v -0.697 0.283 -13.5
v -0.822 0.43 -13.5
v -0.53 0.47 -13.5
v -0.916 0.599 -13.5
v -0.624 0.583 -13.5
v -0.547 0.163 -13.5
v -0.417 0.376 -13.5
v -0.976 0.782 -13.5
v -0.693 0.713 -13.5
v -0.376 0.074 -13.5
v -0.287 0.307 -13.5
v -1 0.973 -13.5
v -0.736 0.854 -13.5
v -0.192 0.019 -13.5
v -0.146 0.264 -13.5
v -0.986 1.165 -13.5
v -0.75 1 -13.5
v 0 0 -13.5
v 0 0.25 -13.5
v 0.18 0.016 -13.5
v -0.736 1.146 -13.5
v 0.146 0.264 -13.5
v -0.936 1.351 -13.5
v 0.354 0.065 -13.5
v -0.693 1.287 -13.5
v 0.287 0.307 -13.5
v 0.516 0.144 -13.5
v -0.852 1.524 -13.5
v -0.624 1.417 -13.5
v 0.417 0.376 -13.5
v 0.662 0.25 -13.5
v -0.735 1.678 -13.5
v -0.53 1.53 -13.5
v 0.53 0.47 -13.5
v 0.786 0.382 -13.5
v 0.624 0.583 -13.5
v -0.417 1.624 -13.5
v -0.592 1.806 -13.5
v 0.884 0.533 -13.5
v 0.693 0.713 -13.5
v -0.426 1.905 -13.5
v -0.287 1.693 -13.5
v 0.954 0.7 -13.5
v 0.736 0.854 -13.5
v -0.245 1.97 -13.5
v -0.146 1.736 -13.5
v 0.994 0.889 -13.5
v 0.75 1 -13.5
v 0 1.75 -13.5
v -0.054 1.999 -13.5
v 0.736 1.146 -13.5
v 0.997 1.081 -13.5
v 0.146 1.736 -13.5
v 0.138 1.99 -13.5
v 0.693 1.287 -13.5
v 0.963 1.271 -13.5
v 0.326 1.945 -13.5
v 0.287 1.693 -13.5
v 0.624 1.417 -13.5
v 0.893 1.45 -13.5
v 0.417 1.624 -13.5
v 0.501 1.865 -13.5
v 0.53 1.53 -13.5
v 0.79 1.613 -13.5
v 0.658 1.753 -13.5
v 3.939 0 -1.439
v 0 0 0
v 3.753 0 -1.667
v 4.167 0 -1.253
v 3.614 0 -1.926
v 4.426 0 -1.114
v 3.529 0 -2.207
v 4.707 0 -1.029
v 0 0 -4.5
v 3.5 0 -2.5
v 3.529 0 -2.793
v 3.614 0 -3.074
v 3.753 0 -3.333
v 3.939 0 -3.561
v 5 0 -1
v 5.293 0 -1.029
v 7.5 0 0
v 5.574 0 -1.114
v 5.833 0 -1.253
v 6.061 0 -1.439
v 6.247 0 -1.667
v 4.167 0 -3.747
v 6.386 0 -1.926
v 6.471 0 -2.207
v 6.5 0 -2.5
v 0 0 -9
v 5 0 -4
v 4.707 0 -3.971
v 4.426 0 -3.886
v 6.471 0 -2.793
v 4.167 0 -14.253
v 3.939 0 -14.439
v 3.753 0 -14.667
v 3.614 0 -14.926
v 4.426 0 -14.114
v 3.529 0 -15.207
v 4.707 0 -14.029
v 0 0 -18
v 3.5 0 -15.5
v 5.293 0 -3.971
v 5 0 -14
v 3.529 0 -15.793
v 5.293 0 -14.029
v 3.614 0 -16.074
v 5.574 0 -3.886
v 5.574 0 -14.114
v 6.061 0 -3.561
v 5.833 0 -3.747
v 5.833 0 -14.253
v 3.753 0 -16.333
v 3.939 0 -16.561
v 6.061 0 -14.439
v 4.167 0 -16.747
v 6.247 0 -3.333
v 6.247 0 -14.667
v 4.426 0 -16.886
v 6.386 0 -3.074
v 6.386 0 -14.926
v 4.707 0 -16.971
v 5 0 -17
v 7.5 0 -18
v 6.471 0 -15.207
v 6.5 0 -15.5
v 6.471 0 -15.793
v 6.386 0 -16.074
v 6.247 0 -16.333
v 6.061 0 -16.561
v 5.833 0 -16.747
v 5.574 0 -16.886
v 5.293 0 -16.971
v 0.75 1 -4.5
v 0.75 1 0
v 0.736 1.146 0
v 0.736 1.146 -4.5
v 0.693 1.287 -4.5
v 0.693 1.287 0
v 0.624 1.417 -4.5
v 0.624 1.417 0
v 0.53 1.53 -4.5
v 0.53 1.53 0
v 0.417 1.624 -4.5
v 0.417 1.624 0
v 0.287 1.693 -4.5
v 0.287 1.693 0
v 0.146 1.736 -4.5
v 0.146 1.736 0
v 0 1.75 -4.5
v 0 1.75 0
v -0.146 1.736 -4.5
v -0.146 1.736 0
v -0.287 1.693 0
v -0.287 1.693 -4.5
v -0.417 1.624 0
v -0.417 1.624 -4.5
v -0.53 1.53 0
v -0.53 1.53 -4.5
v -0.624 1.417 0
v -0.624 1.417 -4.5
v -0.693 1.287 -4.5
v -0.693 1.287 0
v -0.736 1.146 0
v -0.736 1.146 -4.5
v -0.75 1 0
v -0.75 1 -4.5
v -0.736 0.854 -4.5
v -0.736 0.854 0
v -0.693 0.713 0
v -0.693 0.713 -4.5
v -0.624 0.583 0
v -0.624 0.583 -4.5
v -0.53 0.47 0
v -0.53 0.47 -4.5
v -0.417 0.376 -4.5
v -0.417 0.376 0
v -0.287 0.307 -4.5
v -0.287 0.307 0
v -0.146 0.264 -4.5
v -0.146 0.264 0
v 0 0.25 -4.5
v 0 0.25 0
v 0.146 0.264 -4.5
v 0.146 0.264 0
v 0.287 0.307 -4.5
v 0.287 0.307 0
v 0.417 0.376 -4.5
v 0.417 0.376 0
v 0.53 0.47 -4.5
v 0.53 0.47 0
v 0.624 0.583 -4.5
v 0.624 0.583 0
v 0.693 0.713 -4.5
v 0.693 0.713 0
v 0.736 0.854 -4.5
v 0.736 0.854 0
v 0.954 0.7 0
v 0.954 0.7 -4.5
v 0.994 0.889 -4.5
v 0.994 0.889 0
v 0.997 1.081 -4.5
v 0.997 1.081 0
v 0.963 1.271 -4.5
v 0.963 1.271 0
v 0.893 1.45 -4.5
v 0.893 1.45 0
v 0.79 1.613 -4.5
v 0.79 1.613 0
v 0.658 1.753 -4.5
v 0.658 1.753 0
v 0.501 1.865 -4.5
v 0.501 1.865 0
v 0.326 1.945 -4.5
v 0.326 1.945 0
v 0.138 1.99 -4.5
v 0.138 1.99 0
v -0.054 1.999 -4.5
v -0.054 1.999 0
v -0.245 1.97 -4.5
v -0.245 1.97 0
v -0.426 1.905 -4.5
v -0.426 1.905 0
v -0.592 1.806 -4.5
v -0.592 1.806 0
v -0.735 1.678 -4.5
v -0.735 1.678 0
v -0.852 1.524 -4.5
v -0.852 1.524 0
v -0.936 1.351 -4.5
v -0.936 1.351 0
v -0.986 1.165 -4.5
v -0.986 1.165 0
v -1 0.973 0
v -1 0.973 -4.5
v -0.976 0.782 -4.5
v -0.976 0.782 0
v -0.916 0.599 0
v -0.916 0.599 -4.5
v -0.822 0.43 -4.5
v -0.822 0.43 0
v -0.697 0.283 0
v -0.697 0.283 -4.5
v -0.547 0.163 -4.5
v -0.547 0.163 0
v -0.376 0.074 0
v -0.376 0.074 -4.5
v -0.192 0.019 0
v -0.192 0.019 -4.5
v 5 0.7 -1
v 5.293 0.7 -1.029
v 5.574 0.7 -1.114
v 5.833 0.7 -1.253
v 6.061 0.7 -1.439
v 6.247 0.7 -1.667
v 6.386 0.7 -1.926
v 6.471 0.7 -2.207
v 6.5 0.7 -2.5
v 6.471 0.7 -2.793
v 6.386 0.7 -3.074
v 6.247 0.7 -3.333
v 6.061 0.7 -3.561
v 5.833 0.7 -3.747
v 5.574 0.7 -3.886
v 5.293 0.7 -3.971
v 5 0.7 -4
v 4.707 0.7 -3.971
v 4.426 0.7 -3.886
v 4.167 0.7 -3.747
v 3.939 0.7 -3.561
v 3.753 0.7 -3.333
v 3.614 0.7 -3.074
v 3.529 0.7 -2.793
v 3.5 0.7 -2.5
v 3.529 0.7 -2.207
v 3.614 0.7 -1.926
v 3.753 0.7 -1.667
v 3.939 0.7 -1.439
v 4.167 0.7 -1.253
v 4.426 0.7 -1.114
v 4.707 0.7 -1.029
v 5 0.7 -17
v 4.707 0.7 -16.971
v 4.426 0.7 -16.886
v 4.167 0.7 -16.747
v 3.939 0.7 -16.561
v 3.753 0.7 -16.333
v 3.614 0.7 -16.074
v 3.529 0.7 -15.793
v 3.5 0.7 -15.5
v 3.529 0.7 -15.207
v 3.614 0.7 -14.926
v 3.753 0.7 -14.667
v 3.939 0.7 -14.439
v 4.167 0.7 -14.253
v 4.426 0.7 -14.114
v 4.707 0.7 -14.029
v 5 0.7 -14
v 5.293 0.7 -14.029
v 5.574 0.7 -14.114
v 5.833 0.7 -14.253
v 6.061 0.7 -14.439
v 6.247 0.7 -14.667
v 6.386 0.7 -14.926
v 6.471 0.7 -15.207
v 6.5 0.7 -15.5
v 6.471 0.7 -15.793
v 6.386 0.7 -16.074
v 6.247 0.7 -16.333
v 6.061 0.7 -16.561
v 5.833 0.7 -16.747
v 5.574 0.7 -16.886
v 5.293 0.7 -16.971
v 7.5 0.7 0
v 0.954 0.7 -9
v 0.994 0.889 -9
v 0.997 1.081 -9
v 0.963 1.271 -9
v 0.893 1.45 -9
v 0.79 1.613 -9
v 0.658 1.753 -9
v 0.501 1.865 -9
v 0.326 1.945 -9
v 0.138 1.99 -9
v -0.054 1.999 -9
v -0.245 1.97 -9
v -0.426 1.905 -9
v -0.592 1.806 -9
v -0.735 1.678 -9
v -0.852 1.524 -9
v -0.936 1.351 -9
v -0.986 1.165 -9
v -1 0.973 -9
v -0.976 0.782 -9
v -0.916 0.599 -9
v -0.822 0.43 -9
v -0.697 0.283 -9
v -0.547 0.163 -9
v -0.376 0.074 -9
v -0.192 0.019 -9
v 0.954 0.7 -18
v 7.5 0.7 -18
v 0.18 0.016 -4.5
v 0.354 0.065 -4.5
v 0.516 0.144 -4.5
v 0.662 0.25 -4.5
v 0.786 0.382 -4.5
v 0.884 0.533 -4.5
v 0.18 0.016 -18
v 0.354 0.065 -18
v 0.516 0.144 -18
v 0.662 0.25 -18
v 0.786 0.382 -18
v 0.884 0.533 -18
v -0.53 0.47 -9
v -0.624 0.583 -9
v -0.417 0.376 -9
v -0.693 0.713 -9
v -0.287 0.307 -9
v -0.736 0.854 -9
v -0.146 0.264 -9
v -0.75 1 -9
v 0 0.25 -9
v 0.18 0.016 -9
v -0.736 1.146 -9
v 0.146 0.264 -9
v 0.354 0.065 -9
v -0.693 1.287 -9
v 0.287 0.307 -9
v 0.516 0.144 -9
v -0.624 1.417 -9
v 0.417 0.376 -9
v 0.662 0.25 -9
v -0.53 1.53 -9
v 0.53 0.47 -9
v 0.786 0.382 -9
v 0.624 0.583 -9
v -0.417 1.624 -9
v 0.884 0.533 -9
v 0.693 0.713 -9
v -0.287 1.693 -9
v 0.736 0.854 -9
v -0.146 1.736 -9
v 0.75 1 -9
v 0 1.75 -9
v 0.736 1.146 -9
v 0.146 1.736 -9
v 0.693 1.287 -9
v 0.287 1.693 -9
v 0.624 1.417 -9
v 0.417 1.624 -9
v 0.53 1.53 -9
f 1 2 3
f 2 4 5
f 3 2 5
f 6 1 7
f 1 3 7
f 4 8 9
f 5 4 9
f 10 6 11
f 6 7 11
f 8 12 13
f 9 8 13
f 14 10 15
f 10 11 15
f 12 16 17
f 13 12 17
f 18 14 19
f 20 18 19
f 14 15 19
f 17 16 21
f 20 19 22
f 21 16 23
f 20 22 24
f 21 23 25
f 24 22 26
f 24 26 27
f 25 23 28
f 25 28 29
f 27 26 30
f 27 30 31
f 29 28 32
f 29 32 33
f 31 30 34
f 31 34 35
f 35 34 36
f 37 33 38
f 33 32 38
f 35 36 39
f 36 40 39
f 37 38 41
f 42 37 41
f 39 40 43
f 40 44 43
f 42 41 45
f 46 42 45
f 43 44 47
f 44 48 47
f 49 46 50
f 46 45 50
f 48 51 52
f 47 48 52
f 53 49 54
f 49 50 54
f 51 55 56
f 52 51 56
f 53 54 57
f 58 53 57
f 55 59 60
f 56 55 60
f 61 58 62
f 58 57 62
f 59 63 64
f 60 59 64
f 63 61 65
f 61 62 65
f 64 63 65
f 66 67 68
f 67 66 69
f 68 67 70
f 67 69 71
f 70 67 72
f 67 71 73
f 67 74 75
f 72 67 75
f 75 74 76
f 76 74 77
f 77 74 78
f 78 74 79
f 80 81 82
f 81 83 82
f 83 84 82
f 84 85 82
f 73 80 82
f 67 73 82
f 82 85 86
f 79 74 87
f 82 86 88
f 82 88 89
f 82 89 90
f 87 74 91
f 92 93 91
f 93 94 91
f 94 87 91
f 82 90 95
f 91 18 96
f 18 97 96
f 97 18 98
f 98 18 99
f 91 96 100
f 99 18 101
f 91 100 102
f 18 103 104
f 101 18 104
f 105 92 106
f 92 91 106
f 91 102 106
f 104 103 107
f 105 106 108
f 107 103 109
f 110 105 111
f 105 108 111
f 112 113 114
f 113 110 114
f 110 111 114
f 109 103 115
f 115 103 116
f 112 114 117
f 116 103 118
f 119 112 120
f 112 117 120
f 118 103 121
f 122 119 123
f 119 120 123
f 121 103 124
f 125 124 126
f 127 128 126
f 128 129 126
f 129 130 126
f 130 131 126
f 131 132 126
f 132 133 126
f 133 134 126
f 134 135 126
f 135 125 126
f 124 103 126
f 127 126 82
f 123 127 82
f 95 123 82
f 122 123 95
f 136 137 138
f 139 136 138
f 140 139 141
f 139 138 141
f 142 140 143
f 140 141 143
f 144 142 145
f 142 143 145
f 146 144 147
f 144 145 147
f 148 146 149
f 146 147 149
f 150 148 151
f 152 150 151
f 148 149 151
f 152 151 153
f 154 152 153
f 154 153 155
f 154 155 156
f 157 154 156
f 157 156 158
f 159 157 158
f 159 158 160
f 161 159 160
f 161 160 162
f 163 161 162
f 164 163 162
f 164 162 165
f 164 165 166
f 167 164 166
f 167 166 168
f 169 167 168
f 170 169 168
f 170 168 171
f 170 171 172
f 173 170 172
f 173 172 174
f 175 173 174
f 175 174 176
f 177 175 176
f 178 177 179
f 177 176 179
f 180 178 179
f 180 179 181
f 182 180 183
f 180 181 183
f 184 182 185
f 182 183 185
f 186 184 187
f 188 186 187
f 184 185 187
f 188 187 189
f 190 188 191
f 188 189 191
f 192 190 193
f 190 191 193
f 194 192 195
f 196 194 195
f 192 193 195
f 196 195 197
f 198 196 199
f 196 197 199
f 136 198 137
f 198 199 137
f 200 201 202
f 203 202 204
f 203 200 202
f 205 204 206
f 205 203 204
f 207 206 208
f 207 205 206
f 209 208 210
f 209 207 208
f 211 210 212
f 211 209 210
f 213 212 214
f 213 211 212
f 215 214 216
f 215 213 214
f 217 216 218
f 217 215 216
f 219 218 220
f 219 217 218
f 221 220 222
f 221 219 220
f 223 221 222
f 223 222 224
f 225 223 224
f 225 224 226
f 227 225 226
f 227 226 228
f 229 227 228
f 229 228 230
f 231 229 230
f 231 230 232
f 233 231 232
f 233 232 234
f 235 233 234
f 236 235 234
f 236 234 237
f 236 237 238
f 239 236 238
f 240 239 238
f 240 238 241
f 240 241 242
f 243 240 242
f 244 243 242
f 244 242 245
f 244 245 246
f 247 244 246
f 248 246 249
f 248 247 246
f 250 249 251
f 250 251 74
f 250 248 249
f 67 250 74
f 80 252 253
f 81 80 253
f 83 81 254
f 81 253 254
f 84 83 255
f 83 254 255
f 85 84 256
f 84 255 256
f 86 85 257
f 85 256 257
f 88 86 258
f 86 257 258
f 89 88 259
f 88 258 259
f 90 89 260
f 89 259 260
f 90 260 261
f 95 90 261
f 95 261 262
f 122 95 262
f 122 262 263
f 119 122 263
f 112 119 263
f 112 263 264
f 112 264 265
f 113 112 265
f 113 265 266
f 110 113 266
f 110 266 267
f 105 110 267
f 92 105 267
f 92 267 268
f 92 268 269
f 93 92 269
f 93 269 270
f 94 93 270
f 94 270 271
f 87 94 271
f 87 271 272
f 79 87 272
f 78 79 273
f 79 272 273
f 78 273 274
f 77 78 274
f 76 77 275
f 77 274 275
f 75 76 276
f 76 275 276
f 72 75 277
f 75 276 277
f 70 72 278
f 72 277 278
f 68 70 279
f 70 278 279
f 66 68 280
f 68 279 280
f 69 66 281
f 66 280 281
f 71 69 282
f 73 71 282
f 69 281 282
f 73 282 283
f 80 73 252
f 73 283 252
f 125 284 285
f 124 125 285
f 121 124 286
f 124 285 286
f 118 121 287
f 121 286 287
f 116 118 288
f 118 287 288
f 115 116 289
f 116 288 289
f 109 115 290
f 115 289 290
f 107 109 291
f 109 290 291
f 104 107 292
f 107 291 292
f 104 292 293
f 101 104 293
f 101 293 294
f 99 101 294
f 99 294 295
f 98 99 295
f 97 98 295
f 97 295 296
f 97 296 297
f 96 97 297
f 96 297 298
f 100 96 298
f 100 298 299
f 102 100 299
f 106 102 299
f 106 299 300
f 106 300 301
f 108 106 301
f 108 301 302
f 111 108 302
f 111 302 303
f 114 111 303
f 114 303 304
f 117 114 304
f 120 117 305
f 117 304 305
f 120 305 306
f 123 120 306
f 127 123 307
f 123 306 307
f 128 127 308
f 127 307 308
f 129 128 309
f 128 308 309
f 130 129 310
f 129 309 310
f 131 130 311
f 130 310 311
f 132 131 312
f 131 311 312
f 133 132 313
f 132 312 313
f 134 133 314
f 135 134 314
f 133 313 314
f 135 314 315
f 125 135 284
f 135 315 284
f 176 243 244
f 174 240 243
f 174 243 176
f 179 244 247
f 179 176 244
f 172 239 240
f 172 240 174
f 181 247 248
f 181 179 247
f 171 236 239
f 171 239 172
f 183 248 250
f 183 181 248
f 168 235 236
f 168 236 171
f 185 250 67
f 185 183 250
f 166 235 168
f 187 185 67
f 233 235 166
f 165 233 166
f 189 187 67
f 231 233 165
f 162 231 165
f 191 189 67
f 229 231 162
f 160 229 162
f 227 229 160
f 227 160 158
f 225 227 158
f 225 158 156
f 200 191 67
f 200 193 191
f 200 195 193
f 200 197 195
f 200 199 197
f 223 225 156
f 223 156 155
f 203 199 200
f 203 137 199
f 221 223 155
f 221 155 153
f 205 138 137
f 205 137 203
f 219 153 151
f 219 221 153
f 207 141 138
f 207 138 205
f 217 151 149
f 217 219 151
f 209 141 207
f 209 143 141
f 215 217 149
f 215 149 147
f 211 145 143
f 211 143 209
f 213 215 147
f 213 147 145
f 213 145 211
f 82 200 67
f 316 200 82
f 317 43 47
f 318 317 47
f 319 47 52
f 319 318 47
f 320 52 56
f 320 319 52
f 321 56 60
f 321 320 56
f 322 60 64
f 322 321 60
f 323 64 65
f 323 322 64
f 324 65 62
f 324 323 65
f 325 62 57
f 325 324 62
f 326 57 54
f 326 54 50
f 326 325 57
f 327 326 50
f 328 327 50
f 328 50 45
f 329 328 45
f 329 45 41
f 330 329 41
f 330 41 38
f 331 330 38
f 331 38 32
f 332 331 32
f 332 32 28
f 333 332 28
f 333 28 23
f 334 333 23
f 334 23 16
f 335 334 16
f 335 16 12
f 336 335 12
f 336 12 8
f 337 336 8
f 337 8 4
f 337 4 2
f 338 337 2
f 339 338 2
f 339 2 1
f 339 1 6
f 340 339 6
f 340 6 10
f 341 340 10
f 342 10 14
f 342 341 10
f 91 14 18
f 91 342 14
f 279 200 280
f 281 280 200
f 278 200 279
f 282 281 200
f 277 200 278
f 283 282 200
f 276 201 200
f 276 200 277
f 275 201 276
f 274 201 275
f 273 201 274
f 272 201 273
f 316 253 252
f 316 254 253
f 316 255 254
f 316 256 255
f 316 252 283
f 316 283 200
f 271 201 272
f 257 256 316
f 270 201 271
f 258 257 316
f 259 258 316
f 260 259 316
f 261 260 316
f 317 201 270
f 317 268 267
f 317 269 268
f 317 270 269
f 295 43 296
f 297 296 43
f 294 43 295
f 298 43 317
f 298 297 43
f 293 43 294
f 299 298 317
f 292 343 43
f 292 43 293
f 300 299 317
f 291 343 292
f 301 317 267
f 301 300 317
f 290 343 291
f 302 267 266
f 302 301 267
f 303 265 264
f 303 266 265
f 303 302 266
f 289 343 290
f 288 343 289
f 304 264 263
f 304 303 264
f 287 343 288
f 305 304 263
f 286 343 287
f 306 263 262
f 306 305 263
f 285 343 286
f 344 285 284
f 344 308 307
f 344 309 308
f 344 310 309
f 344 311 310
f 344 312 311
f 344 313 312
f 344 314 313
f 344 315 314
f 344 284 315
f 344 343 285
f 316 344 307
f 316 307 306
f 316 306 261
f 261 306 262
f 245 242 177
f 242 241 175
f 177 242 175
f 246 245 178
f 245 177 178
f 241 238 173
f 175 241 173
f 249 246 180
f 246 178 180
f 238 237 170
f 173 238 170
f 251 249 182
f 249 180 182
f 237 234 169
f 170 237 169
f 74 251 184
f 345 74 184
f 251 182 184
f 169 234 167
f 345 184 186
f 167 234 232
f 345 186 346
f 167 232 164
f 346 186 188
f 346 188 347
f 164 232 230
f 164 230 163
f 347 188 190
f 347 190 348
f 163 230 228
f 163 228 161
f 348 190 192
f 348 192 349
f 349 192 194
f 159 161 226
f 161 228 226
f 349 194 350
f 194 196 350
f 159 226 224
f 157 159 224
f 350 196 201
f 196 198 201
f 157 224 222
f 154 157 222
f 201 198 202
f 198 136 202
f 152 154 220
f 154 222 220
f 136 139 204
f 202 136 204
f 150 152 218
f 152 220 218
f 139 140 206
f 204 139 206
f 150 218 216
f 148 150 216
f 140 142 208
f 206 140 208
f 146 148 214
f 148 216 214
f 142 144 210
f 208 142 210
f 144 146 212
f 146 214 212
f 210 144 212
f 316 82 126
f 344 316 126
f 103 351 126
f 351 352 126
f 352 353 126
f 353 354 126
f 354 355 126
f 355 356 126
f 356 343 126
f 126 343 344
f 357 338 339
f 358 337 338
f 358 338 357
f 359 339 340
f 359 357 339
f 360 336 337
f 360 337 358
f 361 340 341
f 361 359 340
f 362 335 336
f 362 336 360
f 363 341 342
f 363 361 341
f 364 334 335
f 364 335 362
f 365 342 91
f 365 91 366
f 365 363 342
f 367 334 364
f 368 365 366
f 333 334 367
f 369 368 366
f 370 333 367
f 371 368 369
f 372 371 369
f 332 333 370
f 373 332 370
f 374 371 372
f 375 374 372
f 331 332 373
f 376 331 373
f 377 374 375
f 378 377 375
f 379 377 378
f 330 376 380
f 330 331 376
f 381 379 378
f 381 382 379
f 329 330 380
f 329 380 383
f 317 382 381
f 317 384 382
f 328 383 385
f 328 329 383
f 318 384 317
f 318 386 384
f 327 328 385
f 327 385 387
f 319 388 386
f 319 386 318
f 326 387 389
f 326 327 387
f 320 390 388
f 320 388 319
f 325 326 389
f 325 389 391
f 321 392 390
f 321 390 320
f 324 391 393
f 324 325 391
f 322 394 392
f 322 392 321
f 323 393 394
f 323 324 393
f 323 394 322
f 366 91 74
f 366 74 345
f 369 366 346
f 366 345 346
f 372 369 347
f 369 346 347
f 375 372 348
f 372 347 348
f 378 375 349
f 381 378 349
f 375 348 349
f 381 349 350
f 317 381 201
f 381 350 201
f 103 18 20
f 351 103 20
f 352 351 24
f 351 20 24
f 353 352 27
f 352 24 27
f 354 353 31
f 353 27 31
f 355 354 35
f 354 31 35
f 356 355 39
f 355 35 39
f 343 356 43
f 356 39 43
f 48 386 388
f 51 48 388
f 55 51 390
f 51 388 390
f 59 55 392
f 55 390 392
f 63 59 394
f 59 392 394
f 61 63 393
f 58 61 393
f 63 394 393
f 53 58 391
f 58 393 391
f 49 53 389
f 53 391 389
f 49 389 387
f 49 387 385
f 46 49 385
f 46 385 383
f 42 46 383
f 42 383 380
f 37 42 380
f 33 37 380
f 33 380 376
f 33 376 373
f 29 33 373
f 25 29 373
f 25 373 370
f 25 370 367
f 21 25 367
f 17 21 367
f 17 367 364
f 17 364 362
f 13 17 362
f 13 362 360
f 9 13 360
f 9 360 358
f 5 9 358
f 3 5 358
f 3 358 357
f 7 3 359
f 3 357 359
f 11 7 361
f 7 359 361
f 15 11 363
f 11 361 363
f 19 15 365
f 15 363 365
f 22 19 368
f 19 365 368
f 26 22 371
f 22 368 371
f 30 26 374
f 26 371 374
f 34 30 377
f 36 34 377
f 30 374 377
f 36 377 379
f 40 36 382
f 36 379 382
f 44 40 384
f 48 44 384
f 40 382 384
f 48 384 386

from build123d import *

# Parameters (mm, degrees)
SKETCH1_W           = 7.5
SKETCH1_H           = 18
BOSS_EXTRUDE1_DEPTH = 0.7
SKETCH2_R           = 1
BOSS_EXTRUDE2_DEPTH = 18
SKETCH4_R           = 0.75
CUT_EXTRUDE1_DEPTH  = 20.602295784
CUT_EXTRUDE2_START  = -4.5
SKETCH5_R           = 1
CUT_EXTRUDE2_DEPTH  = 4.5
LPATTERN1_COUNT     = 2
LPATTERN1_PITCH     = 9
SKETCH6_R           = 1.5
CUT_EXTRUDE3_DEPTH  = 20.543285292


with BuildPart() as part:
    # Sketch1 → Boss-Extrude1 (new body)
    with BuildSketch(Plane(origin=(0, 0, 0), x_dir=(1, 0, 0), z_dir=(0, 1, 0))):
        with Locations((3.75, 9)):
            Rectangle(SKETCH1_W, SKETCH1_H)
    extrude(amount=BOSS_EXTRUDE1_DEPTH)

    # Sketch2 → Boss-Extrude2 (add, through all)
    with BuildSketch(Plane.XY):
        with Locations((0, 1)):
            Circle(SKETCH2_R)
    extrude(amount=-BOSS_EXTRUDE2_DEPTH)

    # Sketch4 → Cut-Extrude1 (cut, through all)
    with BuildSketch(Plane.XY):
        with Locations((0, 1)):
            Circle(SKETCH4_R)
    extrude(amount=-CUT_EXTRUDE1_DEPTH, mode=Mode.SUBTRACT)

    # Sketch5 → Cut-Extrude2 (cut)
    with BuildSketch(Plane.XY.offset(CUT_EXTRUDE2_START)):
        with Locations((0, 1)):
            Circle(SKETCH5_R)
    cut_extrude2 = extrude(amount=-CUT_EXTRUDE2_DEPTH, mode=Mode.SUBTRACT)

    # LPattern1: Cut-Extrude2 ×2
    with Locations(*[(0, 0, -i * LPATTERN1_PITCH) for i in range(1, LPATTERN1_COUNT)]):
        add(cut_extrude2, mode=Mode.SUBTRACT)

    # Sketch6 → Cut-Extrude3 (cut, through all)
    with BuildSketch(Plane(origin=(0, 0.7, 0), x_dir=(1, 0, 0), z_dir=(0, 1, 0))):
        with Locations(Location((5, 2.5, 0), (0, 0, 270))):
            Circle(SKETCH6_R)
        with Locations(Location((5, 15.5, 0), (0, 0, 90))):
            Circle(SKETCH6_R)
    extrude(amount=-CUT_EXTRUDE3_DEPTH, mode=Mode.SUBTRACT)


solid = part.part
